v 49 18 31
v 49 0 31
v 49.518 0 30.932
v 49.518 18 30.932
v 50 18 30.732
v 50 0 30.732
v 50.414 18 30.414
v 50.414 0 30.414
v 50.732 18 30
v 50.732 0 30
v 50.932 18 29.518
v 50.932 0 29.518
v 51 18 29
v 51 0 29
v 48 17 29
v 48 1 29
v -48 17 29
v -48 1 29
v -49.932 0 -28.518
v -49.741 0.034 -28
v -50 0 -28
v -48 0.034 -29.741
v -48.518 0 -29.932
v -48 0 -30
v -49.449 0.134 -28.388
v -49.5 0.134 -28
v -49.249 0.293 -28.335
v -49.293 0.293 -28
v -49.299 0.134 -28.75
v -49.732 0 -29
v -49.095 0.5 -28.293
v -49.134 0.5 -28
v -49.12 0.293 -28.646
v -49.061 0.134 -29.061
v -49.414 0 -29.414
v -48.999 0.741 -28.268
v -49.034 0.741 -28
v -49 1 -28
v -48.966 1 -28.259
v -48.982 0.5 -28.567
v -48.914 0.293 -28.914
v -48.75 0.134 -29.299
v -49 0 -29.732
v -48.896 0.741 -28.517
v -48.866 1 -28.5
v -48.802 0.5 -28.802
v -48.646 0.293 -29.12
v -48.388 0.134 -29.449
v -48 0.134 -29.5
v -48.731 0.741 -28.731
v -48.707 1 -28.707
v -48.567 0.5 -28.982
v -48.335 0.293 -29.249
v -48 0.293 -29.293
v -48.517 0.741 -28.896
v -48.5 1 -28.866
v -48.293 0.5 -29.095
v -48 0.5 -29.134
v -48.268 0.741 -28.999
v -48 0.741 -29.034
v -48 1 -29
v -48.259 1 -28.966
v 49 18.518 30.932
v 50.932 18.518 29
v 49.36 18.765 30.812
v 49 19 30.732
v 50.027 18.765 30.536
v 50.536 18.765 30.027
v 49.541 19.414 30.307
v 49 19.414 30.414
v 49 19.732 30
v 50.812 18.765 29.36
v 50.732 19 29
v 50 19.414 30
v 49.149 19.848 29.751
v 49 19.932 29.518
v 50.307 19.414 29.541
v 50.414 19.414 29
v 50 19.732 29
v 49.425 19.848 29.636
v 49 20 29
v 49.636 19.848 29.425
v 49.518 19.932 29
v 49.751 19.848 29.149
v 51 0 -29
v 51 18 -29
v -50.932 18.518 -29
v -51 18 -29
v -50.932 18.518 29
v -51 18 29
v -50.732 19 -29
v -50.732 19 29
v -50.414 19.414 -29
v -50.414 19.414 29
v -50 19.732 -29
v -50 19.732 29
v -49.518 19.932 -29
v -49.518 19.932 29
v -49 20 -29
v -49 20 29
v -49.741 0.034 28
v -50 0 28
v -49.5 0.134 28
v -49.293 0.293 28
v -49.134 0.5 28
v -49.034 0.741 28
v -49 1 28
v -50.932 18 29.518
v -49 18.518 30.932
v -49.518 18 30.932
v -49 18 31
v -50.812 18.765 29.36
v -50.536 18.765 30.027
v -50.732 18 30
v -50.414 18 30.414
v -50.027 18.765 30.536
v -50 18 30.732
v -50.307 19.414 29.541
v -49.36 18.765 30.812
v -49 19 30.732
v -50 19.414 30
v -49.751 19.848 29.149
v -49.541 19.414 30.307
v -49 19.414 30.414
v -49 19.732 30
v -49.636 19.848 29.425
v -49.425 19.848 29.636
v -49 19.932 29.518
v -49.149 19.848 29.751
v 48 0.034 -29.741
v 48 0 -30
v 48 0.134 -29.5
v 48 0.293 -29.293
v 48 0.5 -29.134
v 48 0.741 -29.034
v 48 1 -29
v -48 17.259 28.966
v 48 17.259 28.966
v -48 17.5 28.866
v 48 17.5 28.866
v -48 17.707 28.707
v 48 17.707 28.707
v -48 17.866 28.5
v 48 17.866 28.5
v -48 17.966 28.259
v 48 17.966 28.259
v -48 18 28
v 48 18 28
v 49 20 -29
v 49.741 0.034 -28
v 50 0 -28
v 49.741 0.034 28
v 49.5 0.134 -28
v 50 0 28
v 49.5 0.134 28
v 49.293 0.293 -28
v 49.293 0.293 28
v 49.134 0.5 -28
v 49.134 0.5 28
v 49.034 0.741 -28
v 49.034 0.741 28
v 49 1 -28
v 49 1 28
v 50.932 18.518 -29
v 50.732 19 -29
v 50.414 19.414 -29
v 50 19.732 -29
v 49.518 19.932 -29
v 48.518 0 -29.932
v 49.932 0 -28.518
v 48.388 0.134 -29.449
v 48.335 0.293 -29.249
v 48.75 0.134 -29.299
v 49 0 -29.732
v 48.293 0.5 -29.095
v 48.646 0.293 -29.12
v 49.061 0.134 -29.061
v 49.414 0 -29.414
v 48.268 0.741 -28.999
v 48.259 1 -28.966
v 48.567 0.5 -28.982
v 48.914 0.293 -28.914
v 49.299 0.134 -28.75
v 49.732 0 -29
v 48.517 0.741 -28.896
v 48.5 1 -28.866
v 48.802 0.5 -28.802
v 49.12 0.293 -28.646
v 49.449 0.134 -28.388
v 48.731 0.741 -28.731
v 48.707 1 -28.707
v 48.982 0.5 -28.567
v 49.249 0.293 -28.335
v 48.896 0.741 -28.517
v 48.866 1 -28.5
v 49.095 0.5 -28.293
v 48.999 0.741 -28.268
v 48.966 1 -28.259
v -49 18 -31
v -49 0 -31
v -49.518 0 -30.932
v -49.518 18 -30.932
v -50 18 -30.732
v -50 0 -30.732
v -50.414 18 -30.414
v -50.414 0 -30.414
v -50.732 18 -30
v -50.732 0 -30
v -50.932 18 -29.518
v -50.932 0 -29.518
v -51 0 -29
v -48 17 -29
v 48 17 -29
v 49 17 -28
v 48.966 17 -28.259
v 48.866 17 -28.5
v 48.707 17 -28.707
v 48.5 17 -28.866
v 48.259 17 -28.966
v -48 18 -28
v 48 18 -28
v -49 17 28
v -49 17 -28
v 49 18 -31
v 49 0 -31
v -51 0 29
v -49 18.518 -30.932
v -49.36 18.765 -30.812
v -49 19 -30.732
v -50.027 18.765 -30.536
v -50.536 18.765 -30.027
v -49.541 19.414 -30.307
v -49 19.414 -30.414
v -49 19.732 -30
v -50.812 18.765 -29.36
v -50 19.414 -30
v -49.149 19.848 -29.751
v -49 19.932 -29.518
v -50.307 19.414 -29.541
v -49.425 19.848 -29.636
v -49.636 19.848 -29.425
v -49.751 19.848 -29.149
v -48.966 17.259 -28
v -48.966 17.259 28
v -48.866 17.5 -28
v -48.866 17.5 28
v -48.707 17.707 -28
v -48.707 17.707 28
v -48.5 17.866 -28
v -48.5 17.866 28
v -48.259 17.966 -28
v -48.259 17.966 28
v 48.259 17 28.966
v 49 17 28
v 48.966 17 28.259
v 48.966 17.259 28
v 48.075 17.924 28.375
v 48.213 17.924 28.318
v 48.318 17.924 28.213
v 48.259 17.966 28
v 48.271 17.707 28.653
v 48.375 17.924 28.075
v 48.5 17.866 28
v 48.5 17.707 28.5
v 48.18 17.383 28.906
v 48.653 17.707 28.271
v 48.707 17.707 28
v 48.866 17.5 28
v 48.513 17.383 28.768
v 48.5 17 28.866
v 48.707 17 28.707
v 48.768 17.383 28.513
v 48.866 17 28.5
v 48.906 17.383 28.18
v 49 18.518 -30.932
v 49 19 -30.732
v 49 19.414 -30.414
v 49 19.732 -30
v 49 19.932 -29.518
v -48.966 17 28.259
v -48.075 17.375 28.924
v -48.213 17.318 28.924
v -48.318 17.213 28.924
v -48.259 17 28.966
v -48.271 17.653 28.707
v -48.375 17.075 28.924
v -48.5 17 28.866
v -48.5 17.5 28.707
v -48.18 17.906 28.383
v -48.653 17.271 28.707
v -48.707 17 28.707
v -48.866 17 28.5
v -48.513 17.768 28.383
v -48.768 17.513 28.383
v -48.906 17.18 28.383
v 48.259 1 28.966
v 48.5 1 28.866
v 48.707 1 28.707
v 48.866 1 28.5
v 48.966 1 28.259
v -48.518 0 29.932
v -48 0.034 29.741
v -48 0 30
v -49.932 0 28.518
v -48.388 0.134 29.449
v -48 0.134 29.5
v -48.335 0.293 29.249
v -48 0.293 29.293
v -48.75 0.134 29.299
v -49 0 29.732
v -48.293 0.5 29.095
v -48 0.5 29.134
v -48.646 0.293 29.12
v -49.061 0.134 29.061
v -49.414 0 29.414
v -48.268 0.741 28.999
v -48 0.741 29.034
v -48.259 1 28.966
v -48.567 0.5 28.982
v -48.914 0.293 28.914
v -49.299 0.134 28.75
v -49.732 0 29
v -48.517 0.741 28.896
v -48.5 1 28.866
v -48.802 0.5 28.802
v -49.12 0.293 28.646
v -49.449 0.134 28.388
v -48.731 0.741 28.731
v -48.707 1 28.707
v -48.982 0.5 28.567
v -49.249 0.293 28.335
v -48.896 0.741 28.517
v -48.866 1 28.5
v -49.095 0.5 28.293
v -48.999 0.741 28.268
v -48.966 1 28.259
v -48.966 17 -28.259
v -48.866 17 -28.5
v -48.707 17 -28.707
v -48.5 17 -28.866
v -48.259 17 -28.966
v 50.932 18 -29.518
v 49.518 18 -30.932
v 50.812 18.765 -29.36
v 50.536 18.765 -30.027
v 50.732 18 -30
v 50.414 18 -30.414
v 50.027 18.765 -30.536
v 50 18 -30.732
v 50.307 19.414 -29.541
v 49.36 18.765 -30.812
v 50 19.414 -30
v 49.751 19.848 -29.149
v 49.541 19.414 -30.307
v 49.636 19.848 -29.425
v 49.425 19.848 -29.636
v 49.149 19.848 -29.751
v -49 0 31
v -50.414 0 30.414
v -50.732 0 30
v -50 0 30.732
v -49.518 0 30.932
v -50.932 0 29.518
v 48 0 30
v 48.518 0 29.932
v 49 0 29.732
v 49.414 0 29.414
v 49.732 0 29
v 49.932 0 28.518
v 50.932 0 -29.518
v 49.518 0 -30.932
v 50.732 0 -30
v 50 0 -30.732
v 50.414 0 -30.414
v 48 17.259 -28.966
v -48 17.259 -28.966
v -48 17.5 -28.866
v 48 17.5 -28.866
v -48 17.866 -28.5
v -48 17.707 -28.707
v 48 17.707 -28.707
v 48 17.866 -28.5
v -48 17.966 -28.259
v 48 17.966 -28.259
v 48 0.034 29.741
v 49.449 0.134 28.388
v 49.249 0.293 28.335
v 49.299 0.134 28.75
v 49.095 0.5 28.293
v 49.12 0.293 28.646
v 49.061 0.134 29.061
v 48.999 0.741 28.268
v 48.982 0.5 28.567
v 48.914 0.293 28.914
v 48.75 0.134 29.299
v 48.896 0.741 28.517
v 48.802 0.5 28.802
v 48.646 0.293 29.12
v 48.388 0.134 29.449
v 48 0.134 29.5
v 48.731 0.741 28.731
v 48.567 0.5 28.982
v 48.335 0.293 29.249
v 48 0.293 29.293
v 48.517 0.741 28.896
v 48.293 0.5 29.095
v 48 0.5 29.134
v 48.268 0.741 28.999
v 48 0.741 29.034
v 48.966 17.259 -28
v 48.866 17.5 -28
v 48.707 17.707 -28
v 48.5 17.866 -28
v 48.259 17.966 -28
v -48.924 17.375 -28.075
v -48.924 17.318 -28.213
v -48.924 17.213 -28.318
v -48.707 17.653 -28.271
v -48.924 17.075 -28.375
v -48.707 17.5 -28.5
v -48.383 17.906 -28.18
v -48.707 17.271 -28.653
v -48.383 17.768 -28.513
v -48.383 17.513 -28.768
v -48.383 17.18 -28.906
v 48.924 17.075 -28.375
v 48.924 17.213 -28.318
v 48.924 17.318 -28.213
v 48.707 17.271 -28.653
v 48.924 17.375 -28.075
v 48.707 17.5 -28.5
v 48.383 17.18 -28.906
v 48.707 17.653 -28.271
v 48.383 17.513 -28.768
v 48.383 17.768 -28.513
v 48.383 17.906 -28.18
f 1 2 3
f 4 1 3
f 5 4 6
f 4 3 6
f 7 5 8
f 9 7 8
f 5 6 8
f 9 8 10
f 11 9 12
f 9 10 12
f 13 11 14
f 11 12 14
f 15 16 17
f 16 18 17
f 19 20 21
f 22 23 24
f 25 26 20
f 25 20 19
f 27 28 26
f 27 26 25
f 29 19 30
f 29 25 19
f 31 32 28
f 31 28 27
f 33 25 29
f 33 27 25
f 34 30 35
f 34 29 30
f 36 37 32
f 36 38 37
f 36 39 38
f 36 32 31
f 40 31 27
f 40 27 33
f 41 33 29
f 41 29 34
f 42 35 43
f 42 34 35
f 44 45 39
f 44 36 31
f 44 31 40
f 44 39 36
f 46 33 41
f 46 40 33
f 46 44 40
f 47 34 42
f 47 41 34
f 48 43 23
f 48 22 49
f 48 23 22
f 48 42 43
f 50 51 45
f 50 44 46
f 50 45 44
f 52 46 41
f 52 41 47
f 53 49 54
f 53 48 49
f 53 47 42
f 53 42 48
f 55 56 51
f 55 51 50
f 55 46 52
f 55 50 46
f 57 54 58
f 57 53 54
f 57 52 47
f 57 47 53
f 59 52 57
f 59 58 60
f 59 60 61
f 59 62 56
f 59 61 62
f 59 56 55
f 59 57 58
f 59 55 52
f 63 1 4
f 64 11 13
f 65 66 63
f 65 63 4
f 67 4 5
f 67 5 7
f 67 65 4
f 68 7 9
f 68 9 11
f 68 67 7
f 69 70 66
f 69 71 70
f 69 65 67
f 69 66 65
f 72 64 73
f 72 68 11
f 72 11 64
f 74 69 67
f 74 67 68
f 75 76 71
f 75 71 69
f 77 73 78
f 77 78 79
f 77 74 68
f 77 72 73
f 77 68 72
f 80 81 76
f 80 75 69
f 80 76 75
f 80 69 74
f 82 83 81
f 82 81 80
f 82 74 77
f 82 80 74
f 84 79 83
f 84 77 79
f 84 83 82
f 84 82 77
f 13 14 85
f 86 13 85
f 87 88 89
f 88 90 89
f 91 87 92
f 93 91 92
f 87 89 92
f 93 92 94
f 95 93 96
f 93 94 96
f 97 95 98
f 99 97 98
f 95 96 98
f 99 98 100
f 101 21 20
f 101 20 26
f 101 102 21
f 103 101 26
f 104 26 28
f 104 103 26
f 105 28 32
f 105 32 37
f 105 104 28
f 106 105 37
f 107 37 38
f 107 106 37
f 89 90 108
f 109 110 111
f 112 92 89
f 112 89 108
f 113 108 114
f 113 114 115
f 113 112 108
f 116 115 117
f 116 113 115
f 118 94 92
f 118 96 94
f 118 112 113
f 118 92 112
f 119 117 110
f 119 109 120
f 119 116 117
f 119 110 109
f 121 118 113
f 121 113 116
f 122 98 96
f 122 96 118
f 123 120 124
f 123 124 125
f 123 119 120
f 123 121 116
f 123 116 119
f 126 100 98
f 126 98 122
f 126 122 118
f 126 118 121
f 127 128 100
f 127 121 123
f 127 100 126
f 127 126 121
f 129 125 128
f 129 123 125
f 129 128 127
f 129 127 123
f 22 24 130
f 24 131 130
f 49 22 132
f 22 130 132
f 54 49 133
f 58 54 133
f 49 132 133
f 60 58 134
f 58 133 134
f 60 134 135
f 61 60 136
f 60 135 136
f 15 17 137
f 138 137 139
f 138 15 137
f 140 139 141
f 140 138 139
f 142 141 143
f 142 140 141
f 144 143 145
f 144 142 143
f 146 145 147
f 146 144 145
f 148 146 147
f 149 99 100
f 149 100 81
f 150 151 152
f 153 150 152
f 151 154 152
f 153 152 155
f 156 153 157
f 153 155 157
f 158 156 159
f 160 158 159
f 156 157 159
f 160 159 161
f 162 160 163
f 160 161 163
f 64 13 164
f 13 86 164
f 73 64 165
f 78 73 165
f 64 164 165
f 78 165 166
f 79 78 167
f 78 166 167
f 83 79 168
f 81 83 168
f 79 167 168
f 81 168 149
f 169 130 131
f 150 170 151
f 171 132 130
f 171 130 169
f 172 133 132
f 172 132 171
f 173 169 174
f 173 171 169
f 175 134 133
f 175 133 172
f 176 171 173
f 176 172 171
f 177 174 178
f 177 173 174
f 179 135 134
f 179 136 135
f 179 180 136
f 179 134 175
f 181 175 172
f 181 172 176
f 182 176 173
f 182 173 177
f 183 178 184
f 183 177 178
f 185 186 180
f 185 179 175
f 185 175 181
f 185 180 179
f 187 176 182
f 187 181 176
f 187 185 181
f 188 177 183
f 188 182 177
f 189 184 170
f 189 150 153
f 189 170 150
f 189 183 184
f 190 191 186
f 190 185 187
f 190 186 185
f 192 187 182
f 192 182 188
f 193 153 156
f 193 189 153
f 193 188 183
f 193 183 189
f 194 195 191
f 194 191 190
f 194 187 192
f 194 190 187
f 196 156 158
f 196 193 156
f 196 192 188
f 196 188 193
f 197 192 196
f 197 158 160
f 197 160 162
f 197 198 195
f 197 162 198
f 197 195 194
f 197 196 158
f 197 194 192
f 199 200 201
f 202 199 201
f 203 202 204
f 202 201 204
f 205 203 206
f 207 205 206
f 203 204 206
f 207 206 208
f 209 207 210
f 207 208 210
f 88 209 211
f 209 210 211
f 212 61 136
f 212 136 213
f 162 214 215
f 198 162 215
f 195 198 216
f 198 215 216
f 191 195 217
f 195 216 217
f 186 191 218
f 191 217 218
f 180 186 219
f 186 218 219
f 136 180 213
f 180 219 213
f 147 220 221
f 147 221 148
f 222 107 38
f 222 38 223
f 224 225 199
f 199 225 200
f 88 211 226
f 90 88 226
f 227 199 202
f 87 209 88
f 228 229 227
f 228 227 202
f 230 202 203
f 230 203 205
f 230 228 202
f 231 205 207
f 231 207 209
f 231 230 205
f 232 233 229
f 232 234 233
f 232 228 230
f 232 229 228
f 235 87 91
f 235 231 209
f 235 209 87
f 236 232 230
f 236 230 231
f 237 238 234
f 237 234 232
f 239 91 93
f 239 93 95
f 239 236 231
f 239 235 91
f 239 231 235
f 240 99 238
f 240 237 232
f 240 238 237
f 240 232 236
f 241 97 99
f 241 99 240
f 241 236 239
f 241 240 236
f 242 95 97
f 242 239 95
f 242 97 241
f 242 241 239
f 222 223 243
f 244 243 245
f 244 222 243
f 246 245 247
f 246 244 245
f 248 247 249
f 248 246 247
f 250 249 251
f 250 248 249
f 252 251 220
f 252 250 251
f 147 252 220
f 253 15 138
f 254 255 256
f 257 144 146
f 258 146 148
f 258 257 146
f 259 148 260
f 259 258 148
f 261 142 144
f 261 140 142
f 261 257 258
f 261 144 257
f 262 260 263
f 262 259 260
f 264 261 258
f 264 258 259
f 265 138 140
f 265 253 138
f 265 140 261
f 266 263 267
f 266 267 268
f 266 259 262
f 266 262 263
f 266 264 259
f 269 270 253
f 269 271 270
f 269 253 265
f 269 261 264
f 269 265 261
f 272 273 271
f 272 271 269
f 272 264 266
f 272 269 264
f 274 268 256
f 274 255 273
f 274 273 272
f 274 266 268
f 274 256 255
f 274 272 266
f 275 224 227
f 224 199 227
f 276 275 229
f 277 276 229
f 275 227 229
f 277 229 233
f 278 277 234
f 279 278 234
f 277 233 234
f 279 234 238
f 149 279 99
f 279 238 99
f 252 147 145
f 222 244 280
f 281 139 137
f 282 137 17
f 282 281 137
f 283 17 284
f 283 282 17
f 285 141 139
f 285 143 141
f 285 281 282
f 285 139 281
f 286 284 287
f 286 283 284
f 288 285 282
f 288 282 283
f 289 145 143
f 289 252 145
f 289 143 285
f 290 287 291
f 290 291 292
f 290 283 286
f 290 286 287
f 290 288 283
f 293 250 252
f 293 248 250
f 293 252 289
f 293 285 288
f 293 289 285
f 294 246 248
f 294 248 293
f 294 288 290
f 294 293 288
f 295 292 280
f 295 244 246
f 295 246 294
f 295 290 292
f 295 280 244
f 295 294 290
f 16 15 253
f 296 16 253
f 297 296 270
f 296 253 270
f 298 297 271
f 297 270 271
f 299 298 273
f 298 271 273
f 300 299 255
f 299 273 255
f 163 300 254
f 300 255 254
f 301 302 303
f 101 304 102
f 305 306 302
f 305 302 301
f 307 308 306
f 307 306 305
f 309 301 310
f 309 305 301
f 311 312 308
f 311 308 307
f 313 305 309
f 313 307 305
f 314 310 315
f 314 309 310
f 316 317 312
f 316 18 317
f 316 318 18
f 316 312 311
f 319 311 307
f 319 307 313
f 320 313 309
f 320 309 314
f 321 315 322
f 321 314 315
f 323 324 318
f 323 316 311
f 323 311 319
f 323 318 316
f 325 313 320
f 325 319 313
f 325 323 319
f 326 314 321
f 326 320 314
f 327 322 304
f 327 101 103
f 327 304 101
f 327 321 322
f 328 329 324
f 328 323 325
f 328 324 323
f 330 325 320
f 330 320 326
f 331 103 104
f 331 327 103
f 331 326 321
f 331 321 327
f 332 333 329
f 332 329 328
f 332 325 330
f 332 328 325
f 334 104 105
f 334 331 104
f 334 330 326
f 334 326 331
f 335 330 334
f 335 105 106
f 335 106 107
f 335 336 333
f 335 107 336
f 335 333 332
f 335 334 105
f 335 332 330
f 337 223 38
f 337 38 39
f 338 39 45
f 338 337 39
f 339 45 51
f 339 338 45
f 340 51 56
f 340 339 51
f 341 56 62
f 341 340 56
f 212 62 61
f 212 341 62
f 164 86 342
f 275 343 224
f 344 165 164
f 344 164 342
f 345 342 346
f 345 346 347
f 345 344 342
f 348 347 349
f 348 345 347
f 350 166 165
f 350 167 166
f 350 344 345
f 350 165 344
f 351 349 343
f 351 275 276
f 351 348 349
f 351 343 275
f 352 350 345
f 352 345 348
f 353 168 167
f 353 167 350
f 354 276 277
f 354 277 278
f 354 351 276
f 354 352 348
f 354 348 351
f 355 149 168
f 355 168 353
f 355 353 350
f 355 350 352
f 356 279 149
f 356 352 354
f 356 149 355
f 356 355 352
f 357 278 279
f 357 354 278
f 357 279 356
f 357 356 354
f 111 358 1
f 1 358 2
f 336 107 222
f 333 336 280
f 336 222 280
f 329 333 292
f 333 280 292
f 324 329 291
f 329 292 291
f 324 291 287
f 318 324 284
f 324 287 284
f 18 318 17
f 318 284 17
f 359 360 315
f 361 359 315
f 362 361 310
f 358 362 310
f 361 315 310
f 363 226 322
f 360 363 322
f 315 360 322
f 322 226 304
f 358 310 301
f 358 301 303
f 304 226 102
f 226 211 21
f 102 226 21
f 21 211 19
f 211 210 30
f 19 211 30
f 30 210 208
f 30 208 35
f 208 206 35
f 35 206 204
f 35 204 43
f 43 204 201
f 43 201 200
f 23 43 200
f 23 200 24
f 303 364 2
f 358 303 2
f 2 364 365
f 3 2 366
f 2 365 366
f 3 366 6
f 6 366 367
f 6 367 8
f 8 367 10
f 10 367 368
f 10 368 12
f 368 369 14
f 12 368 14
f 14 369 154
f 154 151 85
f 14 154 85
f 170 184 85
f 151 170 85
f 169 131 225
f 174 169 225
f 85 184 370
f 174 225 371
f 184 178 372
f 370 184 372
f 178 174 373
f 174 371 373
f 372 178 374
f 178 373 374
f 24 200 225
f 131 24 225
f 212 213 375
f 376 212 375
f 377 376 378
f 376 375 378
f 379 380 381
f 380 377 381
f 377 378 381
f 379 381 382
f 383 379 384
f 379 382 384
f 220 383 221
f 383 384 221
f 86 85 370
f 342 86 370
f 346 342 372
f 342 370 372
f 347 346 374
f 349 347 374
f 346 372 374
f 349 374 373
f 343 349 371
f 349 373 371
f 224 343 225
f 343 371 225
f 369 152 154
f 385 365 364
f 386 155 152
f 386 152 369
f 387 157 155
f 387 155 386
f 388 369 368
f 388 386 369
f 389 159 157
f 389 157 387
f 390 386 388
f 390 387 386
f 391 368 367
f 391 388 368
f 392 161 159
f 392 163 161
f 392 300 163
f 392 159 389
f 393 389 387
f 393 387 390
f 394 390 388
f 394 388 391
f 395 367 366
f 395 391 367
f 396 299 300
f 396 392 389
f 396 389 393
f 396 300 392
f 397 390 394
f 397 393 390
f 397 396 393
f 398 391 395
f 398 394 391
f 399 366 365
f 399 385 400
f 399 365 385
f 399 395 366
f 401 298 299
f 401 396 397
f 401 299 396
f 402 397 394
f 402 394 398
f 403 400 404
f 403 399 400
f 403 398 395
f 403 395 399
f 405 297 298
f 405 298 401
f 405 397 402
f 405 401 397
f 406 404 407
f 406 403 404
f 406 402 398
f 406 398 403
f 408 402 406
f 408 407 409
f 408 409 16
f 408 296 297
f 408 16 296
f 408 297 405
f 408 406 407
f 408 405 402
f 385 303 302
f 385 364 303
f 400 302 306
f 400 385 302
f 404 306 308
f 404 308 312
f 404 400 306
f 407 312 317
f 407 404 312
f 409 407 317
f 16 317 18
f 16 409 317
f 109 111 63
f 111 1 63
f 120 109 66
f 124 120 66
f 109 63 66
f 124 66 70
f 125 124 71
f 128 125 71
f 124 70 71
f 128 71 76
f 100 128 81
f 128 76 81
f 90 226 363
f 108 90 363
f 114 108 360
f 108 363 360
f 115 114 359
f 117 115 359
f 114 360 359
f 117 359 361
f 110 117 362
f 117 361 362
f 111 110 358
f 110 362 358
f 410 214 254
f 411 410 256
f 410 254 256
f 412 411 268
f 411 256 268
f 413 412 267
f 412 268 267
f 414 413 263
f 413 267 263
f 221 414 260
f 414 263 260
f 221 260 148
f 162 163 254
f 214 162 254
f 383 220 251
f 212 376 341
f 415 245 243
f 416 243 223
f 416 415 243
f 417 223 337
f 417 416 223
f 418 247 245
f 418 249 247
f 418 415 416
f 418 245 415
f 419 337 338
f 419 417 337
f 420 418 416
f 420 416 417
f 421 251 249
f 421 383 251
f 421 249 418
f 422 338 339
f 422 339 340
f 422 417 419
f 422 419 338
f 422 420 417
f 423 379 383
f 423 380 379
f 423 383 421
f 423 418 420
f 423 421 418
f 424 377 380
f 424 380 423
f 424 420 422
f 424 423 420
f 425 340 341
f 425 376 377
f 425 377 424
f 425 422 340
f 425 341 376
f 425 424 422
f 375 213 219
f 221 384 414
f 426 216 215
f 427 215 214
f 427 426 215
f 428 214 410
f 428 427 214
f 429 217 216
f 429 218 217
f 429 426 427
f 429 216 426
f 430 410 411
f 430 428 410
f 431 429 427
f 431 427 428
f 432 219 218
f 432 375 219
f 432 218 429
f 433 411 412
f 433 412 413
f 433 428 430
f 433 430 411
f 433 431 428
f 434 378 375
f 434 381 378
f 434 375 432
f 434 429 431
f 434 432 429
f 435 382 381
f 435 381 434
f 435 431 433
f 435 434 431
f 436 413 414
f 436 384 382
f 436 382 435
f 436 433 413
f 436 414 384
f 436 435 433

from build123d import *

# Parameters (mm, degrees)
BOSS_EXTRUDE1_DEPTH = 20
FILLET1_R           = 2
SHELL1_START        = -49
SHELL1_OUTLINE_W    = 18
SHELL1_OUTLINE_H    = 58
SHELL1_DEPTH        = 98
FILLET2_R           = 1


# Read off the part's stored shape, not the designer's step: Shell1
with BuildPart() as part:
    # Sketch1 → Boss-Extrude1 (new body)
    with BuildSketch(Plane(origin=(0, 0, 0), x_dir=(1, 0, 0), z_dir=(0, 1, 0))):
        with BuildLine():
            Line((-49, -31), (49, -31))
            ThreePointArc((49, -31), (50.414213562, -30.414213562), (51, -29))
            Line((51, -29), (51, 29))
            ThreePointArc((51, 29), (50.414213562, 30.414213562), (49, 31))
            Line((49, 31), (-49, 31))
            ThreePointArc((-49, 31), (-50.414213562, 30.414213562), (-51, 29))
            Line((-51, 29), (-51, -29))
            ThreePointArc((-51, -29), (-50.414213562, -30.414213562), (-49, -31))
        make_face()
    extrude(amount=BOSS_EXTRUDE1_DEPTH)

    # Fillet1
    fillet1_edges = [part.edges().sort_by_distance(p)[0] for p in [
        (50.414213562, 20, -30.414213562),
        (0, 20, -31),
        (-50.414213562, 20, -30.414213562),
        (-51, 20, 0),
        (-50.414213562, 20, 30.414213562),
        (0, 20, 31),
        (50.414213562, 20, 30.414213562),
        (51, 20, 0),
    ]]
    fillet(fillet1_edges, radius=FILLET1_R)

    # Shell1 outline → Shell1 (cut)
    with BuildSketch(Plane.YZ.offset(SHELL1_START)):
        with Locations((9, 0)):
            Rectangle(SHELL1_OUTLINE_W, SHELL1_OUTLINE_H)
    extrude(amount=SHELL1_DEPTH, mode=Mode.SUBTRACT)

    # Fillet2
    fillet2_edges = [part.edges().sort_by_distance(p)[0] for p in [
        (49, 9, 29),
        (49, 0, 0),
        (0, 18, -29),
        (49, 9, -29),
        (0, 0, -29),
        (-49, 18, 0),
        (-49, 9, -29),
        (-49, 0, 0),
        (0, 18, 29),
        (-49, 9, 29),
        (0, 0, 29),
        (49, 18, 0),
    ]]
    fillet(fillet2_edges, radius=FILLET2_R)


solid = part.part
